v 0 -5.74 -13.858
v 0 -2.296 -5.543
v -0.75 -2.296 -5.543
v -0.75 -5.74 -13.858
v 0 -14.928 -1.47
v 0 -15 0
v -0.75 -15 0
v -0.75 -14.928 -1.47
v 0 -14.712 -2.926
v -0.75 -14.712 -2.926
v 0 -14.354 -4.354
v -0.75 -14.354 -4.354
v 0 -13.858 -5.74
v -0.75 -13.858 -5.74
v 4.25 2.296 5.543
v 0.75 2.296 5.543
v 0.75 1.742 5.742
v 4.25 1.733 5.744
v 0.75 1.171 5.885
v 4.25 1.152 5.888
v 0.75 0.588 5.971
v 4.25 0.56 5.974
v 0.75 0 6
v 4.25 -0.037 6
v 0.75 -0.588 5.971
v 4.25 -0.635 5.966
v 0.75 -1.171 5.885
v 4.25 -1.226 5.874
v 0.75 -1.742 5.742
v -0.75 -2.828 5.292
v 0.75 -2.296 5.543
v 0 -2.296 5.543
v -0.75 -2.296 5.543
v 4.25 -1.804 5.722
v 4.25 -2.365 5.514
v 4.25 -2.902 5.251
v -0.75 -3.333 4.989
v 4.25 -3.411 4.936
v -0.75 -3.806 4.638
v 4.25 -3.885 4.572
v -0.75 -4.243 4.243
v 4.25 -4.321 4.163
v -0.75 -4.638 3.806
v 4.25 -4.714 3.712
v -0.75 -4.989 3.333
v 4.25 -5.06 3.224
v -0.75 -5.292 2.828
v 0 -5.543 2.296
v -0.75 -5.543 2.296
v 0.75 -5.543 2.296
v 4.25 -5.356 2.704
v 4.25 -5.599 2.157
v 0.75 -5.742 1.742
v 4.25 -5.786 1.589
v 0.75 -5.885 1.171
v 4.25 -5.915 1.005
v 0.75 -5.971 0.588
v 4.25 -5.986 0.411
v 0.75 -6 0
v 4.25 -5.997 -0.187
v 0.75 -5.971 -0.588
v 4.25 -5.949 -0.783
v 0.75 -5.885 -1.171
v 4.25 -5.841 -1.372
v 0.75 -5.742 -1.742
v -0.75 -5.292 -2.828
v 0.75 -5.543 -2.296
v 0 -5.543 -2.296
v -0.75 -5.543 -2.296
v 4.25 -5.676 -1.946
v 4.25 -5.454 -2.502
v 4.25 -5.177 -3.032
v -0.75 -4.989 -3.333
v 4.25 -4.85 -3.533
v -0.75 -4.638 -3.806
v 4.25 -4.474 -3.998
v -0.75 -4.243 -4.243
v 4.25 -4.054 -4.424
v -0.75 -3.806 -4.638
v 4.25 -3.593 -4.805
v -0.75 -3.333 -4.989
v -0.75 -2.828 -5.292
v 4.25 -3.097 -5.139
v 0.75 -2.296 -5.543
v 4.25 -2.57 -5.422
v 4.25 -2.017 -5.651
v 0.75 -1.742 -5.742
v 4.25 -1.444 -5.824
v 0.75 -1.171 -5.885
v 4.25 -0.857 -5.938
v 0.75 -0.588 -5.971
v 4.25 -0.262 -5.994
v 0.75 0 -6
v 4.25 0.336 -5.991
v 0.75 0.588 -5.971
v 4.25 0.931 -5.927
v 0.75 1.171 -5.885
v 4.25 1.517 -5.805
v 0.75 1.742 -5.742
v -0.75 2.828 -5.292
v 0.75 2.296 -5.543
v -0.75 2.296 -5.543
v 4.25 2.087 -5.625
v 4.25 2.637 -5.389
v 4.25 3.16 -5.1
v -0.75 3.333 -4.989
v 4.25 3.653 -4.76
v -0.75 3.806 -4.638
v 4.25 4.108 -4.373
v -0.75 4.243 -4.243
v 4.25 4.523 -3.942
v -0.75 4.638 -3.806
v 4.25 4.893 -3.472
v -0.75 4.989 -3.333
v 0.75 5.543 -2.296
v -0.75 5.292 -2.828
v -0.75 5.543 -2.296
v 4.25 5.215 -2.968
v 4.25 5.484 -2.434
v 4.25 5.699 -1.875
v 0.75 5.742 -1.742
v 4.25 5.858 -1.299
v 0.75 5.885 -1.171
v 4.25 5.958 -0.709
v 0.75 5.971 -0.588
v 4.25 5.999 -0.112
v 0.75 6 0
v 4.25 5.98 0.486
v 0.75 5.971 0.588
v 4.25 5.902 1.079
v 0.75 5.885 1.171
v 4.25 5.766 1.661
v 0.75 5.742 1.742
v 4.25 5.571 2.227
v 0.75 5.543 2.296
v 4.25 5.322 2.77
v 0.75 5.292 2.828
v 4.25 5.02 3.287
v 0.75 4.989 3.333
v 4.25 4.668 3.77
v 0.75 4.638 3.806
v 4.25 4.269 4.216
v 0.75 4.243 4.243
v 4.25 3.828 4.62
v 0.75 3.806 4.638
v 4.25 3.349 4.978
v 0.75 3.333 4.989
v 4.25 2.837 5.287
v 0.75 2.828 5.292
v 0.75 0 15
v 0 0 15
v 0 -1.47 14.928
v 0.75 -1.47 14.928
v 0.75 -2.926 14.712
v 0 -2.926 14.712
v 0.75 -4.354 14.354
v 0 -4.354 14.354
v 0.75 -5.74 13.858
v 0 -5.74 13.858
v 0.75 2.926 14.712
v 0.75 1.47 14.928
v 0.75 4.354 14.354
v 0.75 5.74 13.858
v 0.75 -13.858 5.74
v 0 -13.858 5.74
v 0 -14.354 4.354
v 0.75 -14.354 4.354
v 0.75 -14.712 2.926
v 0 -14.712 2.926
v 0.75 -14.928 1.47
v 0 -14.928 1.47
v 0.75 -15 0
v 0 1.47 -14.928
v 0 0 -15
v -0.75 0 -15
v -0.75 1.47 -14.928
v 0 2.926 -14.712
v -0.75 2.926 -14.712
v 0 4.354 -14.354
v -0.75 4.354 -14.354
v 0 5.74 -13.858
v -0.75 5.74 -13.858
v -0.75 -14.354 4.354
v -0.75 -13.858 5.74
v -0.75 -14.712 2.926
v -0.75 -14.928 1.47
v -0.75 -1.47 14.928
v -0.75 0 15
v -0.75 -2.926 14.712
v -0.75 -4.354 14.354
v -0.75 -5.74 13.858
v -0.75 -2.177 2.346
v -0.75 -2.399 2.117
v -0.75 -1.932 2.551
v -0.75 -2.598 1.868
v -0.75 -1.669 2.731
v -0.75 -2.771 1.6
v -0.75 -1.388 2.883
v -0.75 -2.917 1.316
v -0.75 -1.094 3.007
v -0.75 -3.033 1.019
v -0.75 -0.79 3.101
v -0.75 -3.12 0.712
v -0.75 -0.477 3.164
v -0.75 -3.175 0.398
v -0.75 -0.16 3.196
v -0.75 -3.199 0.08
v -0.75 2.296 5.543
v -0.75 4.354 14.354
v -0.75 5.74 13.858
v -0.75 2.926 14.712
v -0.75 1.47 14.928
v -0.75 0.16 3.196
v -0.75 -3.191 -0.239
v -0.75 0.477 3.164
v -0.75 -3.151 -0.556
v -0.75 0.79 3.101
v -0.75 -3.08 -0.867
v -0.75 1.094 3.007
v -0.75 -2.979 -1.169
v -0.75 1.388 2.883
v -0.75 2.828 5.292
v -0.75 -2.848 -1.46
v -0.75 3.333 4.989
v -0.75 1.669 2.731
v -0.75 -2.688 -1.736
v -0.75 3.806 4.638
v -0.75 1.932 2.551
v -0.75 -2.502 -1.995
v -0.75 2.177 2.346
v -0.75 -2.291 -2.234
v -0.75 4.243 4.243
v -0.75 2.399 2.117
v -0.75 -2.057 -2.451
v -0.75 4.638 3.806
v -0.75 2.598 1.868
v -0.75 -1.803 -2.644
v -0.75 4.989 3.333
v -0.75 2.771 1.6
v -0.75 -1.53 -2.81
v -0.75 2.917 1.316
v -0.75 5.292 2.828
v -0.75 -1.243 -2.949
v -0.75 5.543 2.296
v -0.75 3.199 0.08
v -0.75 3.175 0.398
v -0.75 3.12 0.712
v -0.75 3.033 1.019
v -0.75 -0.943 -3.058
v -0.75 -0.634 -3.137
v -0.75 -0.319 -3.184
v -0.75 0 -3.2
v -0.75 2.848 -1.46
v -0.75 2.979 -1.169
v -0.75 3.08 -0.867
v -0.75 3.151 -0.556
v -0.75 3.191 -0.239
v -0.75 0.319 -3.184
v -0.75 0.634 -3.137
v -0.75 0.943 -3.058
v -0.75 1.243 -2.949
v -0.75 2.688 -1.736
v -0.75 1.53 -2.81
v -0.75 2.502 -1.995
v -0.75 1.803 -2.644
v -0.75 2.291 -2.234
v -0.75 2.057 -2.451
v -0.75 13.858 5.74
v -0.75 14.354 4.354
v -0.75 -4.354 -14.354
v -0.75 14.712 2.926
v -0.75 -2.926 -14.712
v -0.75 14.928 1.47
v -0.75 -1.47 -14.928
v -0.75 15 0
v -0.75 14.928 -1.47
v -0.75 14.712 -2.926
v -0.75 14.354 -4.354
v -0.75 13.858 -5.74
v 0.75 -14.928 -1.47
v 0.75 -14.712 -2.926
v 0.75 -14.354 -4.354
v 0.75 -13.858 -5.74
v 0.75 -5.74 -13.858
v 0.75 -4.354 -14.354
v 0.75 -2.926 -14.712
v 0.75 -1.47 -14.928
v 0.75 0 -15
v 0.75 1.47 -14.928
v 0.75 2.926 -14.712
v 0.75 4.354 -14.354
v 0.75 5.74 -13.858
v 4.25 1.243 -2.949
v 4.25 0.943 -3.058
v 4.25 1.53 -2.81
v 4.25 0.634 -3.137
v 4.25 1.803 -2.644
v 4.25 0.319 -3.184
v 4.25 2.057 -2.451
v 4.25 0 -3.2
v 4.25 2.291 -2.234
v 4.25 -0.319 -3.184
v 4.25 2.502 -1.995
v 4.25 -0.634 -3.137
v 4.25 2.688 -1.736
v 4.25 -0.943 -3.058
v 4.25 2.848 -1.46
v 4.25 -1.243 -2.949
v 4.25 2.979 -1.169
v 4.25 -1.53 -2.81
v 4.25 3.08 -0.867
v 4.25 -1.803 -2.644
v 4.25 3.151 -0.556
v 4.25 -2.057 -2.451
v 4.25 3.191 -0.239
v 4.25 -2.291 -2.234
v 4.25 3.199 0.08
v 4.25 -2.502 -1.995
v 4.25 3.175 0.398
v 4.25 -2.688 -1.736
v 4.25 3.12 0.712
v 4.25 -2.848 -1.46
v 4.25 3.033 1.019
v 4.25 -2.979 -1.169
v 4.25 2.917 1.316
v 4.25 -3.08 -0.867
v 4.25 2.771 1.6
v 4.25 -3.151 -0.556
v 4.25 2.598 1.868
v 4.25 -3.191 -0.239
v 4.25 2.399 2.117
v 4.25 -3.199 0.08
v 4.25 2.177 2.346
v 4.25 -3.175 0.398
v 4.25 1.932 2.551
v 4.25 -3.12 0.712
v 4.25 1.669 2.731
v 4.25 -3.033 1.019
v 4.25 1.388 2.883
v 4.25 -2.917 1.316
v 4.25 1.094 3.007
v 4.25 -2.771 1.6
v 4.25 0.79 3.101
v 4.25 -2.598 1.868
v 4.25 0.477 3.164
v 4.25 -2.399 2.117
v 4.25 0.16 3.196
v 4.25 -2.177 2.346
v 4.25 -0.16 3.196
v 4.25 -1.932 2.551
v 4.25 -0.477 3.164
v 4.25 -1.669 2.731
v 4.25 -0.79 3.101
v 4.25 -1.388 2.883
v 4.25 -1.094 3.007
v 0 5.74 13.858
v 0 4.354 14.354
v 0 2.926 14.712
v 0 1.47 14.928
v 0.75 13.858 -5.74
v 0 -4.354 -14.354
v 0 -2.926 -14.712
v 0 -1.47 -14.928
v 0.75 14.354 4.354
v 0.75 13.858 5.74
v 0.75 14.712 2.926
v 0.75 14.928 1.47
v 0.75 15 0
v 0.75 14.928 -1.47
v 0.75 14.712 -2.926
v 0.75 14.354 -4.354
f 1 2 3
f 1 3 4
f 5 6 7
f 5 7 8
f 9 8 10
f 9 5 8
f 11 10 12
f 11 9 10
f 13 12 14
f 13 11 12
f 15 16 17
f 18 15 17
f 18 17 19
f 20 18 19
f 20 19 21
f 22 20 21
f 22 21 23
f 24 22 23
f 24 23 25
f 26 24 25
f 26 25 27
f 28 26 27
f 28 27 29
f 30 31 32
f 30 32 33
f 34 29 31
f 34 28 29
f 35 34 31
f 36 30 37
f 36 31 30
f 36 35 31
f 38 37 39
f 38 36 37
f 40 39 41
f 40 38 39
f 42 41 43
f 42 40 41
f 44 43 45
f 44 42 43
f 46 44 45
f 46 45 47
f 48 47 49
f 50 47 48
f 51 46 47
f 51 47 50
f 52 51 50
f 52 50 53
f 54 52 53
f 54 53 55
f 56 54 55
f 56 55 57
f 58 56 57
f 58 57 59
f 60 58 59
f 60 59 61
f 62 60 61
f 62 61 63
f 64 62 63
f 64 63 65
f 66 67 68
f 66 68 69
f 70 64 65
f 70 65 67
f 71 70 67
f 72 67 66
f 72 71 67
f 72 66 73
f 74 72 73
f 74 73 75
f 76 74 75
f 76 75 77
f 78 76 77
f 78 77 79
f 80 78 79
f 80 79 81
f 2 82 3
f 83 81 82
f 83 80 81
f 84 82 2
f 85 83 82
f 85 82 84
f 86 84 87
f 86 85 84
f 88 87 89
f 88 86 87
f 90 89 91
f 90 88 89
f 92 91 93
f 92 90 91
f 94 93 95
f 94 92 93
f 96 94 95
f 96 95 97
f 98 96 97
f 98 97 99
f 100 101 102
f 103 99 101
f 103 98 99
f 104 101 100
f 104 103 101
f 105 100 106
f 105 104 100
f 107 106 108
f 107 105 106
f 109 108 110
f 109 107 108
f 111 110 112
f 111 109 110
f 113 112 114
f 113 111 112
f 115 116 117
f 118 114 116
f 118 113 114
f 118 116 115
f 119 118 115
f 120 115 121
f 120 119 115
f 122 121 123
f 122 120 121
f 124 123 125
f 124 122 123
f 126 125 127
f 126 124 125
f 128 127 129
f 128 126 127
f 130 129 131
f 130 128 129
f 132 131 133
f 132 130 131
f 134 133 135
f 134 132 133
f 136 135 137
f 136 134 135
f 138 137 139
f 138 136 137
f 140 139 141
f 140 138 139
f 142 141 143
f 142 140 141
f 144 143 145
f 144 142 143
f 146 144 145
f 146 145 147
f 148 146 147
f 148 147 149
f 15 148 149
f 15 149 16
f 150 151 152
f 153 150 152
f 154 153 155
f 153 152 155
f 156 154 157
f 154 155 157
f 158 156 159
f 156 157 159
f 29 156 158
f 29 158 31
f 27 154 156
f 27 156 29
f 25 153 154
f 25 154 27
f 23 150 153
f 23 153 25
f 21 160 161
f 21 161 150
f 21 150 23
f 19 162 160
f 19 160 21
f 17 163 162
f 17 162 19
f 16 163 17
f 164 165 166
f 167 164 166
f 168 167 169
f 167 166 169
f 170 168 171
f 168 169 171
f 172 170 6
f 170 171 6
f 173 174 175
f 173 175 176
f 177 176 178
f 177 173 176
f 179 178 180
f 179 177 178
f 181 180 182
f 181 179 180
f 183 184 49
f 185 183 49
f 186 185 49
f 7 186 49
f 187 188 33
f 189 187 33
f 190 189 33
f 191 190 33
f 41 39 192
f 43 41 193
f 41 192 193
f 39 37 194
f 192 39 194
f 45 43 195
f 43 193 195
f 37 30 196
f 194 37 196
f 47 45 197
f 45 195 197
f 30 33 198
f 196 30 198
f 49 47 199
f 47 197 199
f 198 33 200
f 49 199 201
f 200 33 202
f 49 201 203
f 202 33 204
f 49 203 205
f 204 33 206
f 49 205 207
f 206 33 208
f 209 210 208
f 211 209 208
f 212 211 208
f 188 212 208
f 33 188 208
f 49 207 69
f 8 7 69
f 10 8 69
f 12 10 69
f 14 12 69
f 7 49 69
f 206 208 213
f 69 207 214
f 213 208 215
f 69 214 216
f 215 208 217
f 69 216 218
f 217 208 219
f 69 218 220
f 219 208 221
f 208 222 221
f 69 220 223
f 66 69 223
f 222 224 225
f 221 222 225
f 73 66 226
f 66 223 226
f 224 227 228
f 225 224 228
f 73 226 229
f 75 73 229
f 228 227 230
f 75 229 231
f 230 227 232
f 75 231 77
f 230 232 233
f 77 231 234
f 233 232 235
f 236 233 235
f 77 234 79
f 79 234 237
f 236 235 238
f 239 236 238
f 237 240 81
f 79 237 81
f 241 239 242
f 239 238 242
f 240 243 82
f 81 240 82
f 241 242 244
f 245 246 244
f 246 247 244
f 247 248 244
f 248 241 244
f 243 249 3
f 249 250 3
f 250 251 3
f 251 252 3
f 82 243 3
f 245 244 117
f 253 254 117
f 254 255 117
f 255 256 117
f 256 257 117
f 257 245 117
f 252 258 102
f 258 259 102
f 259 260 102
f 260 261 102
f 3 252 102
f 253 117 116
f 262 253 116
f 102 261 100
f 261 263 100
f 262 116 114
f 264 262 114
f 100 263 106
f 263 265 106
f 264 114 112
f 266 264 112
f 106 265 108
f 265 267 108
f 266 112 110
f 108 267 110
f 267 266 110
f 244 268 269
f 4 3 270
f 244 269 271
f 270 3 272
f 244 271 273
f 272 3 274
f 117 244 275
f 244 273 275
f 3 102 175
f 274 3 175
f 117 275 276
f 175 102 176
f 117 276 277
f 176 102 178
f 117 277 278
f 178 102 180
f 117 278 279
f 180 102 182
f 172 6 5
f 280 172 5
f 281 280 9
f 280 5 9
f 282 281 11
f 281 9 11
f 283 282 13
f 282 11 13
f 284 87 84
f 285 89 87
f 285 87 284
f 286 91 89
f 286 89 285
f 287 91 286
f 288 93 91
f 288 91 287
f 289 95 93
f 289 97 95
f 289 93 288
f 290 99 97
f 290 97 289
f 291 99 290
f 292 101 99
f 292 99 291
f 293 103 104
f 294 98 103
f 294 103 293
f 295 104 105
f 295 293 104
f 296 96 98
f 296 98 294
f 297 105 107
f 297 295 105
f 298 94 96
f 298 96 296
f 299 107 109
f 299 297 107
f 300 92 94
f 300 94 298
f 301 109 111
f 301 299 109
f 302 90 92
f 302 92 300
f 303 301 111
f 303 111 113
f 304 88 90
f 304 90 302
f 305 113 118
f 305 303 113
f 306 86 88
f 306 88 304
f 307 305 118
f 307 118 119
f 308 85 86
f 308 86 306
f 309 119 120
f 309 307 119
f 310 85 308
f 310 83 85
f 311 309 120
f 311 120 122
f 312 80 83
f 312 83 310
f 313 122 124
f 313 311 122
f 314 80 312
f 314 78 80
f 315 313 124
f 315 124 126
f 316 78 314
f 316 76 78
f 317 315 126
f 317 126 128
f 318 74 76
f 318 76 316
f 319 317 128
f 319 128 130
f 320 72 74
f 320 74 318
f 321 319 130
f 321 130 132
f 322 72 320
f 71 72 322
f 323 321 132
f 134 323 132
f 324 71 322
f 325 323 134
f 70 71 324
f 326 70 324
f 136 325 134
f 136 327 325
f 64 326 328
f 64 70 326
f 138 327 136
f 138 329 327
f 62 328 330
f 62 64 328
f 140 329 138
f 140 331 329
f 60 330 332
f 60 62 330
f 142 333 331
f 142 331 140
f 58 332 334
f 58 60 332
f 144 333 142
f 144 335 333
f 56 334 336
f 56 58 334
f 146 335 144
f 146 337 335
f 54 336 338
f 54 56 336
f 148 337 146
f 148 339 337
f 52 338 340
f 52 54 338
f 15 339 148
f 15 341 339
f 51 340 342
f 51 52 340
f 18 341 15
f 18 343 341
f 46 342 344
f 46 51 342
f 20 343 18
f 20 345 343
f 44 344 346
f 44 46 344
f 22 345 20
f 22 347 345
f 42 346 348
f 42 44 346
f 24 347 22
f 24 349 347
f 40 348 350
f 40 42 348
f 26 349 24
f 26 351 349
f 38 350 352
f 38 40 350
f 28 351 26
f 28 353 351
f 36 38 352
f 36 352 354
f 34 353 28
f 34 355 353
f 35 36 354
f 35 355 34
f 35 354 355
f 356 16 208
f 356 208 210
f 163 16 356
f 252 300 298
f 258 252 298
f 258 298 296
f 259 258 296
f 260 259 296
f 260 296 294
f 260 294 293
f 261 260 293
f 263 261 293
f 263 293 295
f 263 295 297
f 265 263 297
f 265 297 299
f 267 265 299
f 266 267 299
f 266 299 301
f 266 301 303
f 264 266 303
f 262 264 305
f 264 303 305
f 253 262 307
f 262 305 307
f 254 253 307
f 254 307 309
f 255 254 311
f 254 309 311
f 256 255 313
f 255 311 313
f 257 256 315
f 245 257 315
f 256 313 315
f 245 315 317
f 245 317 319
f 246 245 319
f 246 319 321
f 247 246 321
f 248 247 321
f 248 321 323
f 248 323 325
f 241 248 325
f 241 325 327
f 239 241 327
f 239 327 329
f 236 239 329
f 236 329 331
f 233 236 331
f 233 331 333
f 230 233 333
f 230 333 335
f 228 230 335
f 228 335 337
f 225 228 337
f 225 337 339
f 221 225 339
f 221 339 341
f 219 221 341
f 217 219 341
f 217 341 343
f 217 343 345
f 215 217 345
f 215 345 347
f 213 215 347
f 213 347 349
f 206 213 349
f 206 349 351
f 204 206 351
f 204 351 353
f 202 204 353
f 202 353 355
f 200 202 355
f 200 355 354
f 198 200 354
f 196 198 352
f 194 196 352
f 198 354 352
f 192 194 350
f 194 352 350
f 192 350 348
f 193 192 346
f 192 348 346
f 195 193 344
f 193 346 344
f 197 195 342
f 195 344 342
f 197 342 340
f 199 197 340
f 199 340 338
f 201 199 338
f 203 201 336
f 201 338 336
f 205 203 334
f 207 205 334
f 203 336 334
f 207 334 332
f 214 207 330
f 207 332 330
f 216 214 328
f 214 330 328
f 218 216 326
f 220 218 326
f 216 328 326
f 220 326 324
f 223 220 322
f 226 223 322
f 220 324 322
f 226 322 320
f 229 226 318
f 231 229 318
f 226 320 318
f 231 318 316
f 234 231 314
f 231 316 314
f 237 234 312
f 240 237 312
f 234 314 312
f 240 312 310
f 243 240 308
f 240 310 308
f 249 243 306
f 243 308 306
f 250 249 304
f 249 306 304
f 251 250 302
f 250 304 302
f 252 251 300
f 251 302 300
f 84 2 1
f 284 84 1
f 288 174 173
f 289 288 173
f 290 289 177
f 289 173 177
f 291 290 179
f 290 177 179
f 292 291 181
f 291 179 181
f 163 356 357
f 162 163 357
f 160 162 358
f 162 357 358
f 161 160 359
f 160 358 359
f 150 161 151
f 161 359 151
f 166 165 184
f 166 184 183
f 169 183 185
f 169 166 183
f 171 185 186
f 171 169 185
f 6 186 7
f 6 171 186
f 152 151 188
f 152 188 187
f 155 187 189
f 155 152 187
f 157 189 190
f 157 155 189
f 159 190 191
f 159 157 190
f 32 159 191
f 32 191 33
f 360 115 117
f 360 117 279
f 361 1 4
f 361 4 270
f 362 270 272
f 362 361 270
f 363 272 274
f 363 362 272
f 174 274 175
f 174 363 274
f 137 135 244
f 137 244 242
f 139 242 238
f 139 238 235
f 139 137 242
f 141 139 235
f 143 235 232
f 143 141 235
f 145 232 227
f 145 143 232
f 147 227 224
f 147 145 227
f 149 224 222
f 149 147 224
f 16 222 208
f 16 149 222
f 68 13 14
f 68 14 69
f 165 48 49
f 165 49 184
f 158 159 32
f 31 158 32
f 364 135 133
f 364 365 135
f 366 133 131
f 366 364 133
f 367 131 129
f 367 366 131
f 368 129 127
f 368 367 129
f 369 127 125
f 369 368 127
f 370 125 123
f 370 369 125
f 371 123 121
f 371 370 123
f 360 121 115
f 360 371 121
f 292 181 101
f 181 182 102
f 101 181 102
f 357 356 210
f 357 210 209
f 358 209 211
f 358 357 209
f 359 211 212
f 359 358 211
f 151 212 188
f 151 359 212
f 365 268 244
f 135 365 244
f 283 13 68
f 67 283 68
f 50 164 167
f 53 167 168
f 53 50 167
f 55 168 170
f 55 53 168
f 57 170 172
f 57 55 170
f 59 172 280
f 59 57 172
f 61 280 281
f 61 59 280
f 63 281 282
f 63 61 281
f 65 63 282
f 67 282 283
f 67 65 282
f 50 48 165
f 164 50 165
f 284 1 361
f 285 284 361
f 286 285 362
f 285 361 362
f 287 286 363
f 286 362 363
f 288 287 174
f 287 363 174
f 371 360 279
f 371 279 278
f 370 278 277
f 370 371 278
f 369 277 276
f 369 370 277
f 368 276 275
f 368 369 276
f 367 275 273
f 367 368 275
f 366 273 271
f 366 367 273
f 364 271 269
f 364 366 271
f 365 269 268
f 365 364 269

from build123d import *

# Parameters (mm, degrees)
CROQUIS1_R              = 3.2
SALIENTE_EXTRUIR1_DEPTH = 0.75
SALIENTE_EXTRUIR2_START = 3.5
CROQUIS2_R              = 6
CROQUIS2_R_2            = 3.2
SALIENTE_EXTRUIR2_DEPTH = 3.5


with BuildPart() as part:
    # Croquis1 → Saliente-Extruir1 (new, symmetric)
    # profile 1 of 9: a face of its own
    with BuildSketch(Plane(origin=(0, 0, 0), x_dir=(0, 0, -1), z_dir=(1, 0, 0))):
        with BuildLine():
            ThreePointArc((-2.2961005941905754, 5.543277195067705), (-1.1705419320967896, 5.884711682419379), (0, 5.999999999999999))
            Line((0, 6), (0, 15))
            ThreePointArc((9.2e-16, 14.999999999999998), (-2.9263548302419715, 14.711779206048444), (-5.740251485476437, 13.85819298766926))
            Line((-5.740251485476437, 13.858192987669263), (-2.296100594190576, 5.543277195067706))
        make_face()
    # profile 2 of 9: a face of its own
    with BuildSketch(Plane(origin=(0, 0, 0), x_dir=(0, 0, -1), z_dir=(1, 0, 0))):
        with BuildLine():
            Line((0, 15), (0, 6))
            ThreePointArc((3.7e-16, 6), (1.1705419320967503, 5.884711682419386), (2.296100594190503, 5.543277195067735))
            Line((2.2961005941905026, 5.543277195067734), (5.740251485476257, 13.858192987669337))
            ThreePointArc((5.740251485476257, 13.858192987669337), (2.9263548302418774, 14.711779206048465), (1.1e-16, 15))
        make_face()
    # profile 3 of 9: a face of its own
    with BuildSketch(Plane(origin=(0, 0, 0), x_dir=(0, 0, -1), z_dir=(1, 0, 0))):
        with BuildLine():
            Line((13.858192987669264, 5.740251485476436), (5.543277195067706, 2.296100594190575))
            ThreePointArc((5.543277195067704, 2.2961005941905754), (5.884711682419379, 1.1705419320967891), (6, 3.7e-16))
            Line((6, 3.7e-16), (15, 9.2e-16))
            ThreePointArc((14.999999999999998, 0), (14.711779206048446, 2.9263548302419706), (13.858192987669263, 5.740251485476435))
        make_face()
    # profile 4 of 9: a face of its own
    with BuildSketch(Plane(origin=(0, 0, 0), x_dir=(0, 0, -1), z_dir=(1, 0, 0))):
        with BuildLine():
            Line((15, 9.2e-16), (6, 3.7e-16))
            ThreePointArc((6, -1.47e-15), (5.884711682419386, -1.1705419320967514), (5.543277195067735, -2.296100594190503))
            Line((5.543277195067734, -2.296100594190502), (13.858192987669337, -5.740251485476256))
            ThreePointArc((13.858192987669337, -5.740251485476256), (14.711779206048465, -2.9263548302418743), (14.999999999999998, 1.11e-15))
        make_face()
    # profile 5 of 9: a face of its own
    with BuildSketch(Plane(origin=(0, 0, 0), x_dir=(0, 0, -1), z_dir=(1, 0, 0))):
        with BuildLine():
            Line((5.740251485476437, -13.858192987669264), (2.2961005941905754, -5.543277195067704))
            ThreePointArc((2.296100594190576, -5.543277195067706), (1.17054193209679, -5.88471168241938), (9.2e-16, -6.000000000000001))
            Line((9.2e-16, -6), (1.84e-15, -15))
            ThreePointArc((-2.76e-15, -14.999999999999998), (2.9263548302419635, -14.711779206048446), (5.740251485476435, -13.858192987669263))
        make_face()
    # profile 6 of 9: a face of its own
    with BuildSketch(Plane(origin=(0, 0, 0), x_dir=(0, 0, -1), z_dir=(1, 0, 0))):
        with BuildLine():
            ThreePointArc((-1.1e-15, -6), (-1.170541932096751, -5.884711682419386), (-2.2961005941905026, -5.543277195067736))
            Line((-2.2961005941905017, -5.543277195067734), (-5.740251485476255, -13.858192987669337))
            ThreePointArc((-5.740251485476255, -13.858192987669337), (-2.9263548302418756, -14.711779206048465), (1.67e-15, -15))
            Line((1.84e-15, -15), (9.2e-16, -6))
        make_face()
    # profile 7 of 9: a face of its own
    with BuildSketch(Plane(origin=(0, 0, 0), x_dir=(0, 0, -1), z_dir=(1, 0, 0))):
        with BuildLine():
            ThreePointArc((-5.543277195067704, -2.296100594190576), (-5.884711682419379, -1.17054193209679), (-6, -1.1e-15))
            Line((-6, -1.1e-15), (-15, -2.76e-15))
            ThreePointArc((-14.999999999999998, 1.84e-15), (-14.711779206048446, -2.9263548302419706), (-13.858192987669263, -5.740251485476436))
            Line((-13.858192987669264, -5.740251485476437), (-5.543277195067706, -2.296100594190576))
        make_face()
    # profile 8 of 9: a face of its own
    with BuildSketch(Plane(origin=(0, 0, 0), x_dir=(0, 0, -1), z_dir=(1, 0, 0))):
        with BuildLine():
            ThreePointArc((-6, 7.3e-16), (-5.884711682419386, 1.1705419320967507), (-5.543277195067736, 2.296100594190502))
            Line((-5.543277195067736, 2.296100594190502), (-13.858192987669339, 5.7402514854762545))
            ThreePointArc((-13.85819298766934, 5.740251485476255), (-14.711779206048467, 2.9263548302418747), (-15.000000000000002, -3.22e-15))
            Line((-15, -2.76e-15), (-6, -1.1e-15))
        make_face()
    # profile 9 of 9: a face of its own
    with BuildSketch(Plane(origin=(0, 0, 0), x_dir=(0, 0, -1), z_dir=(1, 0, 0))):
        with BuildLine():
            ThreePointArc((2.296100594190503, 5.543277195067735), (1.1705419320967503, 5.884711682419386), (3.7e-16, 6))
            ThreePointArc((0, 5.999999999999999), (-1.1705419320967896, 5.884711682419379), (-2.2961005941905754, 5.543277195067705))
            ThreePointArc((-2.2961005941905763, 5.543277195067705), (-3.3334213981176317, 4.98881767381526), (-4.2426406871192865, 4.242640687119284))
            ThreePointArc((-4.242640687119286, 4.242640687119283), (-4.988817673815284, 3.333421398117596), (-5.543277195067734, 2.2961005941905004))
            ThreePointArc((-5.543277195067736, 2.296100594190502), (-5.884711682419386, 1.1705419320967507), (-6, 7.3e-16))
            ThreePointArc((-6, -1.1e-15), (-5.884711682419379, -1.17054193209679), (-5.543277195067704, -2.296100594190576))
            ThreePointArc((-5.543277195067706, -2.2961005941905746), (-4.9888176738152605, -3.333421398117629), (-4.242640687119286, -4.242640687119285))
            ThreePointArc((-4.242640687119285, -4.242640687119287), (-3.333421398117597, -4.988817673815285), (-2.2961005941905013, -5.543277195067736))
            ThreePointArc((-2.2961005941905026, -5.543277195067736), (-1.170541932096751, -5.884711682419386), (-1.1e-15, -6))
            ThreePointArc((9.2e-16, -6.000000000000001), (1.17054193209679, -5.88471168241938), (2.296100594190576, -5.543277195067706))
            ThreePointArc((2.296100594190574, -5.543277195067706), (3.333421398117629, -4.9888176738152605), (4.242640687119284, -4.242640687119286))
            ThreePointArc((4.2426406871192865, -4.242640687119285), (4.988817673815282, -3.333421398117596), (5.543277195067736, -2.296100594190502))
            ThreePointArc((5.543277195067735, -2.296100594190503), (5.884711682419386, -1.1705419320967514), (6, -1.47e-15))
            ThreePointArc((6, 3.7e-16), (5.884711682419379, 1.1705419320967891), (5.543277195067704, 2.2961005941905754))
            ThreePointArc((5.543277195067705, 2.2961005941905754), (4.9888176738152605, 3.333421398117629), (4.242640687119286, 4.242640687119284))
            ThreePointArc((4.242640687119287, 4.2426406871192865), (3.333421398117599, 4.988817673815284), (2.2961005941905035, 5.543277195067736))
        make_face()
        Circle(CROQUIS1_R, mode=Mode.SUBTRACT)
    extrude(amount=SALIENTE_EXTRUIR1_DEPTH, both=True)

    # Croquis2 → Saliente-Extruir2 (add)
    with BuildSketch(Plane(origin=(0.75, 0, 0), x_dir=(0, 0, -1), z_dir=(1, 0, 0)).offset(SALIENTE_EXTRUIR2_START)):
        with Locations(Location((0, 0, 0), (0, 0, 157.5))):
            Circle(CROQUIS2_R)
        Circle(CROQUIS2_R_2, mode=Mode.SUBTRACT)
    extrude(amount=-SALIENTE_EXTRUIR2_DEPTH)


solid = part.part
